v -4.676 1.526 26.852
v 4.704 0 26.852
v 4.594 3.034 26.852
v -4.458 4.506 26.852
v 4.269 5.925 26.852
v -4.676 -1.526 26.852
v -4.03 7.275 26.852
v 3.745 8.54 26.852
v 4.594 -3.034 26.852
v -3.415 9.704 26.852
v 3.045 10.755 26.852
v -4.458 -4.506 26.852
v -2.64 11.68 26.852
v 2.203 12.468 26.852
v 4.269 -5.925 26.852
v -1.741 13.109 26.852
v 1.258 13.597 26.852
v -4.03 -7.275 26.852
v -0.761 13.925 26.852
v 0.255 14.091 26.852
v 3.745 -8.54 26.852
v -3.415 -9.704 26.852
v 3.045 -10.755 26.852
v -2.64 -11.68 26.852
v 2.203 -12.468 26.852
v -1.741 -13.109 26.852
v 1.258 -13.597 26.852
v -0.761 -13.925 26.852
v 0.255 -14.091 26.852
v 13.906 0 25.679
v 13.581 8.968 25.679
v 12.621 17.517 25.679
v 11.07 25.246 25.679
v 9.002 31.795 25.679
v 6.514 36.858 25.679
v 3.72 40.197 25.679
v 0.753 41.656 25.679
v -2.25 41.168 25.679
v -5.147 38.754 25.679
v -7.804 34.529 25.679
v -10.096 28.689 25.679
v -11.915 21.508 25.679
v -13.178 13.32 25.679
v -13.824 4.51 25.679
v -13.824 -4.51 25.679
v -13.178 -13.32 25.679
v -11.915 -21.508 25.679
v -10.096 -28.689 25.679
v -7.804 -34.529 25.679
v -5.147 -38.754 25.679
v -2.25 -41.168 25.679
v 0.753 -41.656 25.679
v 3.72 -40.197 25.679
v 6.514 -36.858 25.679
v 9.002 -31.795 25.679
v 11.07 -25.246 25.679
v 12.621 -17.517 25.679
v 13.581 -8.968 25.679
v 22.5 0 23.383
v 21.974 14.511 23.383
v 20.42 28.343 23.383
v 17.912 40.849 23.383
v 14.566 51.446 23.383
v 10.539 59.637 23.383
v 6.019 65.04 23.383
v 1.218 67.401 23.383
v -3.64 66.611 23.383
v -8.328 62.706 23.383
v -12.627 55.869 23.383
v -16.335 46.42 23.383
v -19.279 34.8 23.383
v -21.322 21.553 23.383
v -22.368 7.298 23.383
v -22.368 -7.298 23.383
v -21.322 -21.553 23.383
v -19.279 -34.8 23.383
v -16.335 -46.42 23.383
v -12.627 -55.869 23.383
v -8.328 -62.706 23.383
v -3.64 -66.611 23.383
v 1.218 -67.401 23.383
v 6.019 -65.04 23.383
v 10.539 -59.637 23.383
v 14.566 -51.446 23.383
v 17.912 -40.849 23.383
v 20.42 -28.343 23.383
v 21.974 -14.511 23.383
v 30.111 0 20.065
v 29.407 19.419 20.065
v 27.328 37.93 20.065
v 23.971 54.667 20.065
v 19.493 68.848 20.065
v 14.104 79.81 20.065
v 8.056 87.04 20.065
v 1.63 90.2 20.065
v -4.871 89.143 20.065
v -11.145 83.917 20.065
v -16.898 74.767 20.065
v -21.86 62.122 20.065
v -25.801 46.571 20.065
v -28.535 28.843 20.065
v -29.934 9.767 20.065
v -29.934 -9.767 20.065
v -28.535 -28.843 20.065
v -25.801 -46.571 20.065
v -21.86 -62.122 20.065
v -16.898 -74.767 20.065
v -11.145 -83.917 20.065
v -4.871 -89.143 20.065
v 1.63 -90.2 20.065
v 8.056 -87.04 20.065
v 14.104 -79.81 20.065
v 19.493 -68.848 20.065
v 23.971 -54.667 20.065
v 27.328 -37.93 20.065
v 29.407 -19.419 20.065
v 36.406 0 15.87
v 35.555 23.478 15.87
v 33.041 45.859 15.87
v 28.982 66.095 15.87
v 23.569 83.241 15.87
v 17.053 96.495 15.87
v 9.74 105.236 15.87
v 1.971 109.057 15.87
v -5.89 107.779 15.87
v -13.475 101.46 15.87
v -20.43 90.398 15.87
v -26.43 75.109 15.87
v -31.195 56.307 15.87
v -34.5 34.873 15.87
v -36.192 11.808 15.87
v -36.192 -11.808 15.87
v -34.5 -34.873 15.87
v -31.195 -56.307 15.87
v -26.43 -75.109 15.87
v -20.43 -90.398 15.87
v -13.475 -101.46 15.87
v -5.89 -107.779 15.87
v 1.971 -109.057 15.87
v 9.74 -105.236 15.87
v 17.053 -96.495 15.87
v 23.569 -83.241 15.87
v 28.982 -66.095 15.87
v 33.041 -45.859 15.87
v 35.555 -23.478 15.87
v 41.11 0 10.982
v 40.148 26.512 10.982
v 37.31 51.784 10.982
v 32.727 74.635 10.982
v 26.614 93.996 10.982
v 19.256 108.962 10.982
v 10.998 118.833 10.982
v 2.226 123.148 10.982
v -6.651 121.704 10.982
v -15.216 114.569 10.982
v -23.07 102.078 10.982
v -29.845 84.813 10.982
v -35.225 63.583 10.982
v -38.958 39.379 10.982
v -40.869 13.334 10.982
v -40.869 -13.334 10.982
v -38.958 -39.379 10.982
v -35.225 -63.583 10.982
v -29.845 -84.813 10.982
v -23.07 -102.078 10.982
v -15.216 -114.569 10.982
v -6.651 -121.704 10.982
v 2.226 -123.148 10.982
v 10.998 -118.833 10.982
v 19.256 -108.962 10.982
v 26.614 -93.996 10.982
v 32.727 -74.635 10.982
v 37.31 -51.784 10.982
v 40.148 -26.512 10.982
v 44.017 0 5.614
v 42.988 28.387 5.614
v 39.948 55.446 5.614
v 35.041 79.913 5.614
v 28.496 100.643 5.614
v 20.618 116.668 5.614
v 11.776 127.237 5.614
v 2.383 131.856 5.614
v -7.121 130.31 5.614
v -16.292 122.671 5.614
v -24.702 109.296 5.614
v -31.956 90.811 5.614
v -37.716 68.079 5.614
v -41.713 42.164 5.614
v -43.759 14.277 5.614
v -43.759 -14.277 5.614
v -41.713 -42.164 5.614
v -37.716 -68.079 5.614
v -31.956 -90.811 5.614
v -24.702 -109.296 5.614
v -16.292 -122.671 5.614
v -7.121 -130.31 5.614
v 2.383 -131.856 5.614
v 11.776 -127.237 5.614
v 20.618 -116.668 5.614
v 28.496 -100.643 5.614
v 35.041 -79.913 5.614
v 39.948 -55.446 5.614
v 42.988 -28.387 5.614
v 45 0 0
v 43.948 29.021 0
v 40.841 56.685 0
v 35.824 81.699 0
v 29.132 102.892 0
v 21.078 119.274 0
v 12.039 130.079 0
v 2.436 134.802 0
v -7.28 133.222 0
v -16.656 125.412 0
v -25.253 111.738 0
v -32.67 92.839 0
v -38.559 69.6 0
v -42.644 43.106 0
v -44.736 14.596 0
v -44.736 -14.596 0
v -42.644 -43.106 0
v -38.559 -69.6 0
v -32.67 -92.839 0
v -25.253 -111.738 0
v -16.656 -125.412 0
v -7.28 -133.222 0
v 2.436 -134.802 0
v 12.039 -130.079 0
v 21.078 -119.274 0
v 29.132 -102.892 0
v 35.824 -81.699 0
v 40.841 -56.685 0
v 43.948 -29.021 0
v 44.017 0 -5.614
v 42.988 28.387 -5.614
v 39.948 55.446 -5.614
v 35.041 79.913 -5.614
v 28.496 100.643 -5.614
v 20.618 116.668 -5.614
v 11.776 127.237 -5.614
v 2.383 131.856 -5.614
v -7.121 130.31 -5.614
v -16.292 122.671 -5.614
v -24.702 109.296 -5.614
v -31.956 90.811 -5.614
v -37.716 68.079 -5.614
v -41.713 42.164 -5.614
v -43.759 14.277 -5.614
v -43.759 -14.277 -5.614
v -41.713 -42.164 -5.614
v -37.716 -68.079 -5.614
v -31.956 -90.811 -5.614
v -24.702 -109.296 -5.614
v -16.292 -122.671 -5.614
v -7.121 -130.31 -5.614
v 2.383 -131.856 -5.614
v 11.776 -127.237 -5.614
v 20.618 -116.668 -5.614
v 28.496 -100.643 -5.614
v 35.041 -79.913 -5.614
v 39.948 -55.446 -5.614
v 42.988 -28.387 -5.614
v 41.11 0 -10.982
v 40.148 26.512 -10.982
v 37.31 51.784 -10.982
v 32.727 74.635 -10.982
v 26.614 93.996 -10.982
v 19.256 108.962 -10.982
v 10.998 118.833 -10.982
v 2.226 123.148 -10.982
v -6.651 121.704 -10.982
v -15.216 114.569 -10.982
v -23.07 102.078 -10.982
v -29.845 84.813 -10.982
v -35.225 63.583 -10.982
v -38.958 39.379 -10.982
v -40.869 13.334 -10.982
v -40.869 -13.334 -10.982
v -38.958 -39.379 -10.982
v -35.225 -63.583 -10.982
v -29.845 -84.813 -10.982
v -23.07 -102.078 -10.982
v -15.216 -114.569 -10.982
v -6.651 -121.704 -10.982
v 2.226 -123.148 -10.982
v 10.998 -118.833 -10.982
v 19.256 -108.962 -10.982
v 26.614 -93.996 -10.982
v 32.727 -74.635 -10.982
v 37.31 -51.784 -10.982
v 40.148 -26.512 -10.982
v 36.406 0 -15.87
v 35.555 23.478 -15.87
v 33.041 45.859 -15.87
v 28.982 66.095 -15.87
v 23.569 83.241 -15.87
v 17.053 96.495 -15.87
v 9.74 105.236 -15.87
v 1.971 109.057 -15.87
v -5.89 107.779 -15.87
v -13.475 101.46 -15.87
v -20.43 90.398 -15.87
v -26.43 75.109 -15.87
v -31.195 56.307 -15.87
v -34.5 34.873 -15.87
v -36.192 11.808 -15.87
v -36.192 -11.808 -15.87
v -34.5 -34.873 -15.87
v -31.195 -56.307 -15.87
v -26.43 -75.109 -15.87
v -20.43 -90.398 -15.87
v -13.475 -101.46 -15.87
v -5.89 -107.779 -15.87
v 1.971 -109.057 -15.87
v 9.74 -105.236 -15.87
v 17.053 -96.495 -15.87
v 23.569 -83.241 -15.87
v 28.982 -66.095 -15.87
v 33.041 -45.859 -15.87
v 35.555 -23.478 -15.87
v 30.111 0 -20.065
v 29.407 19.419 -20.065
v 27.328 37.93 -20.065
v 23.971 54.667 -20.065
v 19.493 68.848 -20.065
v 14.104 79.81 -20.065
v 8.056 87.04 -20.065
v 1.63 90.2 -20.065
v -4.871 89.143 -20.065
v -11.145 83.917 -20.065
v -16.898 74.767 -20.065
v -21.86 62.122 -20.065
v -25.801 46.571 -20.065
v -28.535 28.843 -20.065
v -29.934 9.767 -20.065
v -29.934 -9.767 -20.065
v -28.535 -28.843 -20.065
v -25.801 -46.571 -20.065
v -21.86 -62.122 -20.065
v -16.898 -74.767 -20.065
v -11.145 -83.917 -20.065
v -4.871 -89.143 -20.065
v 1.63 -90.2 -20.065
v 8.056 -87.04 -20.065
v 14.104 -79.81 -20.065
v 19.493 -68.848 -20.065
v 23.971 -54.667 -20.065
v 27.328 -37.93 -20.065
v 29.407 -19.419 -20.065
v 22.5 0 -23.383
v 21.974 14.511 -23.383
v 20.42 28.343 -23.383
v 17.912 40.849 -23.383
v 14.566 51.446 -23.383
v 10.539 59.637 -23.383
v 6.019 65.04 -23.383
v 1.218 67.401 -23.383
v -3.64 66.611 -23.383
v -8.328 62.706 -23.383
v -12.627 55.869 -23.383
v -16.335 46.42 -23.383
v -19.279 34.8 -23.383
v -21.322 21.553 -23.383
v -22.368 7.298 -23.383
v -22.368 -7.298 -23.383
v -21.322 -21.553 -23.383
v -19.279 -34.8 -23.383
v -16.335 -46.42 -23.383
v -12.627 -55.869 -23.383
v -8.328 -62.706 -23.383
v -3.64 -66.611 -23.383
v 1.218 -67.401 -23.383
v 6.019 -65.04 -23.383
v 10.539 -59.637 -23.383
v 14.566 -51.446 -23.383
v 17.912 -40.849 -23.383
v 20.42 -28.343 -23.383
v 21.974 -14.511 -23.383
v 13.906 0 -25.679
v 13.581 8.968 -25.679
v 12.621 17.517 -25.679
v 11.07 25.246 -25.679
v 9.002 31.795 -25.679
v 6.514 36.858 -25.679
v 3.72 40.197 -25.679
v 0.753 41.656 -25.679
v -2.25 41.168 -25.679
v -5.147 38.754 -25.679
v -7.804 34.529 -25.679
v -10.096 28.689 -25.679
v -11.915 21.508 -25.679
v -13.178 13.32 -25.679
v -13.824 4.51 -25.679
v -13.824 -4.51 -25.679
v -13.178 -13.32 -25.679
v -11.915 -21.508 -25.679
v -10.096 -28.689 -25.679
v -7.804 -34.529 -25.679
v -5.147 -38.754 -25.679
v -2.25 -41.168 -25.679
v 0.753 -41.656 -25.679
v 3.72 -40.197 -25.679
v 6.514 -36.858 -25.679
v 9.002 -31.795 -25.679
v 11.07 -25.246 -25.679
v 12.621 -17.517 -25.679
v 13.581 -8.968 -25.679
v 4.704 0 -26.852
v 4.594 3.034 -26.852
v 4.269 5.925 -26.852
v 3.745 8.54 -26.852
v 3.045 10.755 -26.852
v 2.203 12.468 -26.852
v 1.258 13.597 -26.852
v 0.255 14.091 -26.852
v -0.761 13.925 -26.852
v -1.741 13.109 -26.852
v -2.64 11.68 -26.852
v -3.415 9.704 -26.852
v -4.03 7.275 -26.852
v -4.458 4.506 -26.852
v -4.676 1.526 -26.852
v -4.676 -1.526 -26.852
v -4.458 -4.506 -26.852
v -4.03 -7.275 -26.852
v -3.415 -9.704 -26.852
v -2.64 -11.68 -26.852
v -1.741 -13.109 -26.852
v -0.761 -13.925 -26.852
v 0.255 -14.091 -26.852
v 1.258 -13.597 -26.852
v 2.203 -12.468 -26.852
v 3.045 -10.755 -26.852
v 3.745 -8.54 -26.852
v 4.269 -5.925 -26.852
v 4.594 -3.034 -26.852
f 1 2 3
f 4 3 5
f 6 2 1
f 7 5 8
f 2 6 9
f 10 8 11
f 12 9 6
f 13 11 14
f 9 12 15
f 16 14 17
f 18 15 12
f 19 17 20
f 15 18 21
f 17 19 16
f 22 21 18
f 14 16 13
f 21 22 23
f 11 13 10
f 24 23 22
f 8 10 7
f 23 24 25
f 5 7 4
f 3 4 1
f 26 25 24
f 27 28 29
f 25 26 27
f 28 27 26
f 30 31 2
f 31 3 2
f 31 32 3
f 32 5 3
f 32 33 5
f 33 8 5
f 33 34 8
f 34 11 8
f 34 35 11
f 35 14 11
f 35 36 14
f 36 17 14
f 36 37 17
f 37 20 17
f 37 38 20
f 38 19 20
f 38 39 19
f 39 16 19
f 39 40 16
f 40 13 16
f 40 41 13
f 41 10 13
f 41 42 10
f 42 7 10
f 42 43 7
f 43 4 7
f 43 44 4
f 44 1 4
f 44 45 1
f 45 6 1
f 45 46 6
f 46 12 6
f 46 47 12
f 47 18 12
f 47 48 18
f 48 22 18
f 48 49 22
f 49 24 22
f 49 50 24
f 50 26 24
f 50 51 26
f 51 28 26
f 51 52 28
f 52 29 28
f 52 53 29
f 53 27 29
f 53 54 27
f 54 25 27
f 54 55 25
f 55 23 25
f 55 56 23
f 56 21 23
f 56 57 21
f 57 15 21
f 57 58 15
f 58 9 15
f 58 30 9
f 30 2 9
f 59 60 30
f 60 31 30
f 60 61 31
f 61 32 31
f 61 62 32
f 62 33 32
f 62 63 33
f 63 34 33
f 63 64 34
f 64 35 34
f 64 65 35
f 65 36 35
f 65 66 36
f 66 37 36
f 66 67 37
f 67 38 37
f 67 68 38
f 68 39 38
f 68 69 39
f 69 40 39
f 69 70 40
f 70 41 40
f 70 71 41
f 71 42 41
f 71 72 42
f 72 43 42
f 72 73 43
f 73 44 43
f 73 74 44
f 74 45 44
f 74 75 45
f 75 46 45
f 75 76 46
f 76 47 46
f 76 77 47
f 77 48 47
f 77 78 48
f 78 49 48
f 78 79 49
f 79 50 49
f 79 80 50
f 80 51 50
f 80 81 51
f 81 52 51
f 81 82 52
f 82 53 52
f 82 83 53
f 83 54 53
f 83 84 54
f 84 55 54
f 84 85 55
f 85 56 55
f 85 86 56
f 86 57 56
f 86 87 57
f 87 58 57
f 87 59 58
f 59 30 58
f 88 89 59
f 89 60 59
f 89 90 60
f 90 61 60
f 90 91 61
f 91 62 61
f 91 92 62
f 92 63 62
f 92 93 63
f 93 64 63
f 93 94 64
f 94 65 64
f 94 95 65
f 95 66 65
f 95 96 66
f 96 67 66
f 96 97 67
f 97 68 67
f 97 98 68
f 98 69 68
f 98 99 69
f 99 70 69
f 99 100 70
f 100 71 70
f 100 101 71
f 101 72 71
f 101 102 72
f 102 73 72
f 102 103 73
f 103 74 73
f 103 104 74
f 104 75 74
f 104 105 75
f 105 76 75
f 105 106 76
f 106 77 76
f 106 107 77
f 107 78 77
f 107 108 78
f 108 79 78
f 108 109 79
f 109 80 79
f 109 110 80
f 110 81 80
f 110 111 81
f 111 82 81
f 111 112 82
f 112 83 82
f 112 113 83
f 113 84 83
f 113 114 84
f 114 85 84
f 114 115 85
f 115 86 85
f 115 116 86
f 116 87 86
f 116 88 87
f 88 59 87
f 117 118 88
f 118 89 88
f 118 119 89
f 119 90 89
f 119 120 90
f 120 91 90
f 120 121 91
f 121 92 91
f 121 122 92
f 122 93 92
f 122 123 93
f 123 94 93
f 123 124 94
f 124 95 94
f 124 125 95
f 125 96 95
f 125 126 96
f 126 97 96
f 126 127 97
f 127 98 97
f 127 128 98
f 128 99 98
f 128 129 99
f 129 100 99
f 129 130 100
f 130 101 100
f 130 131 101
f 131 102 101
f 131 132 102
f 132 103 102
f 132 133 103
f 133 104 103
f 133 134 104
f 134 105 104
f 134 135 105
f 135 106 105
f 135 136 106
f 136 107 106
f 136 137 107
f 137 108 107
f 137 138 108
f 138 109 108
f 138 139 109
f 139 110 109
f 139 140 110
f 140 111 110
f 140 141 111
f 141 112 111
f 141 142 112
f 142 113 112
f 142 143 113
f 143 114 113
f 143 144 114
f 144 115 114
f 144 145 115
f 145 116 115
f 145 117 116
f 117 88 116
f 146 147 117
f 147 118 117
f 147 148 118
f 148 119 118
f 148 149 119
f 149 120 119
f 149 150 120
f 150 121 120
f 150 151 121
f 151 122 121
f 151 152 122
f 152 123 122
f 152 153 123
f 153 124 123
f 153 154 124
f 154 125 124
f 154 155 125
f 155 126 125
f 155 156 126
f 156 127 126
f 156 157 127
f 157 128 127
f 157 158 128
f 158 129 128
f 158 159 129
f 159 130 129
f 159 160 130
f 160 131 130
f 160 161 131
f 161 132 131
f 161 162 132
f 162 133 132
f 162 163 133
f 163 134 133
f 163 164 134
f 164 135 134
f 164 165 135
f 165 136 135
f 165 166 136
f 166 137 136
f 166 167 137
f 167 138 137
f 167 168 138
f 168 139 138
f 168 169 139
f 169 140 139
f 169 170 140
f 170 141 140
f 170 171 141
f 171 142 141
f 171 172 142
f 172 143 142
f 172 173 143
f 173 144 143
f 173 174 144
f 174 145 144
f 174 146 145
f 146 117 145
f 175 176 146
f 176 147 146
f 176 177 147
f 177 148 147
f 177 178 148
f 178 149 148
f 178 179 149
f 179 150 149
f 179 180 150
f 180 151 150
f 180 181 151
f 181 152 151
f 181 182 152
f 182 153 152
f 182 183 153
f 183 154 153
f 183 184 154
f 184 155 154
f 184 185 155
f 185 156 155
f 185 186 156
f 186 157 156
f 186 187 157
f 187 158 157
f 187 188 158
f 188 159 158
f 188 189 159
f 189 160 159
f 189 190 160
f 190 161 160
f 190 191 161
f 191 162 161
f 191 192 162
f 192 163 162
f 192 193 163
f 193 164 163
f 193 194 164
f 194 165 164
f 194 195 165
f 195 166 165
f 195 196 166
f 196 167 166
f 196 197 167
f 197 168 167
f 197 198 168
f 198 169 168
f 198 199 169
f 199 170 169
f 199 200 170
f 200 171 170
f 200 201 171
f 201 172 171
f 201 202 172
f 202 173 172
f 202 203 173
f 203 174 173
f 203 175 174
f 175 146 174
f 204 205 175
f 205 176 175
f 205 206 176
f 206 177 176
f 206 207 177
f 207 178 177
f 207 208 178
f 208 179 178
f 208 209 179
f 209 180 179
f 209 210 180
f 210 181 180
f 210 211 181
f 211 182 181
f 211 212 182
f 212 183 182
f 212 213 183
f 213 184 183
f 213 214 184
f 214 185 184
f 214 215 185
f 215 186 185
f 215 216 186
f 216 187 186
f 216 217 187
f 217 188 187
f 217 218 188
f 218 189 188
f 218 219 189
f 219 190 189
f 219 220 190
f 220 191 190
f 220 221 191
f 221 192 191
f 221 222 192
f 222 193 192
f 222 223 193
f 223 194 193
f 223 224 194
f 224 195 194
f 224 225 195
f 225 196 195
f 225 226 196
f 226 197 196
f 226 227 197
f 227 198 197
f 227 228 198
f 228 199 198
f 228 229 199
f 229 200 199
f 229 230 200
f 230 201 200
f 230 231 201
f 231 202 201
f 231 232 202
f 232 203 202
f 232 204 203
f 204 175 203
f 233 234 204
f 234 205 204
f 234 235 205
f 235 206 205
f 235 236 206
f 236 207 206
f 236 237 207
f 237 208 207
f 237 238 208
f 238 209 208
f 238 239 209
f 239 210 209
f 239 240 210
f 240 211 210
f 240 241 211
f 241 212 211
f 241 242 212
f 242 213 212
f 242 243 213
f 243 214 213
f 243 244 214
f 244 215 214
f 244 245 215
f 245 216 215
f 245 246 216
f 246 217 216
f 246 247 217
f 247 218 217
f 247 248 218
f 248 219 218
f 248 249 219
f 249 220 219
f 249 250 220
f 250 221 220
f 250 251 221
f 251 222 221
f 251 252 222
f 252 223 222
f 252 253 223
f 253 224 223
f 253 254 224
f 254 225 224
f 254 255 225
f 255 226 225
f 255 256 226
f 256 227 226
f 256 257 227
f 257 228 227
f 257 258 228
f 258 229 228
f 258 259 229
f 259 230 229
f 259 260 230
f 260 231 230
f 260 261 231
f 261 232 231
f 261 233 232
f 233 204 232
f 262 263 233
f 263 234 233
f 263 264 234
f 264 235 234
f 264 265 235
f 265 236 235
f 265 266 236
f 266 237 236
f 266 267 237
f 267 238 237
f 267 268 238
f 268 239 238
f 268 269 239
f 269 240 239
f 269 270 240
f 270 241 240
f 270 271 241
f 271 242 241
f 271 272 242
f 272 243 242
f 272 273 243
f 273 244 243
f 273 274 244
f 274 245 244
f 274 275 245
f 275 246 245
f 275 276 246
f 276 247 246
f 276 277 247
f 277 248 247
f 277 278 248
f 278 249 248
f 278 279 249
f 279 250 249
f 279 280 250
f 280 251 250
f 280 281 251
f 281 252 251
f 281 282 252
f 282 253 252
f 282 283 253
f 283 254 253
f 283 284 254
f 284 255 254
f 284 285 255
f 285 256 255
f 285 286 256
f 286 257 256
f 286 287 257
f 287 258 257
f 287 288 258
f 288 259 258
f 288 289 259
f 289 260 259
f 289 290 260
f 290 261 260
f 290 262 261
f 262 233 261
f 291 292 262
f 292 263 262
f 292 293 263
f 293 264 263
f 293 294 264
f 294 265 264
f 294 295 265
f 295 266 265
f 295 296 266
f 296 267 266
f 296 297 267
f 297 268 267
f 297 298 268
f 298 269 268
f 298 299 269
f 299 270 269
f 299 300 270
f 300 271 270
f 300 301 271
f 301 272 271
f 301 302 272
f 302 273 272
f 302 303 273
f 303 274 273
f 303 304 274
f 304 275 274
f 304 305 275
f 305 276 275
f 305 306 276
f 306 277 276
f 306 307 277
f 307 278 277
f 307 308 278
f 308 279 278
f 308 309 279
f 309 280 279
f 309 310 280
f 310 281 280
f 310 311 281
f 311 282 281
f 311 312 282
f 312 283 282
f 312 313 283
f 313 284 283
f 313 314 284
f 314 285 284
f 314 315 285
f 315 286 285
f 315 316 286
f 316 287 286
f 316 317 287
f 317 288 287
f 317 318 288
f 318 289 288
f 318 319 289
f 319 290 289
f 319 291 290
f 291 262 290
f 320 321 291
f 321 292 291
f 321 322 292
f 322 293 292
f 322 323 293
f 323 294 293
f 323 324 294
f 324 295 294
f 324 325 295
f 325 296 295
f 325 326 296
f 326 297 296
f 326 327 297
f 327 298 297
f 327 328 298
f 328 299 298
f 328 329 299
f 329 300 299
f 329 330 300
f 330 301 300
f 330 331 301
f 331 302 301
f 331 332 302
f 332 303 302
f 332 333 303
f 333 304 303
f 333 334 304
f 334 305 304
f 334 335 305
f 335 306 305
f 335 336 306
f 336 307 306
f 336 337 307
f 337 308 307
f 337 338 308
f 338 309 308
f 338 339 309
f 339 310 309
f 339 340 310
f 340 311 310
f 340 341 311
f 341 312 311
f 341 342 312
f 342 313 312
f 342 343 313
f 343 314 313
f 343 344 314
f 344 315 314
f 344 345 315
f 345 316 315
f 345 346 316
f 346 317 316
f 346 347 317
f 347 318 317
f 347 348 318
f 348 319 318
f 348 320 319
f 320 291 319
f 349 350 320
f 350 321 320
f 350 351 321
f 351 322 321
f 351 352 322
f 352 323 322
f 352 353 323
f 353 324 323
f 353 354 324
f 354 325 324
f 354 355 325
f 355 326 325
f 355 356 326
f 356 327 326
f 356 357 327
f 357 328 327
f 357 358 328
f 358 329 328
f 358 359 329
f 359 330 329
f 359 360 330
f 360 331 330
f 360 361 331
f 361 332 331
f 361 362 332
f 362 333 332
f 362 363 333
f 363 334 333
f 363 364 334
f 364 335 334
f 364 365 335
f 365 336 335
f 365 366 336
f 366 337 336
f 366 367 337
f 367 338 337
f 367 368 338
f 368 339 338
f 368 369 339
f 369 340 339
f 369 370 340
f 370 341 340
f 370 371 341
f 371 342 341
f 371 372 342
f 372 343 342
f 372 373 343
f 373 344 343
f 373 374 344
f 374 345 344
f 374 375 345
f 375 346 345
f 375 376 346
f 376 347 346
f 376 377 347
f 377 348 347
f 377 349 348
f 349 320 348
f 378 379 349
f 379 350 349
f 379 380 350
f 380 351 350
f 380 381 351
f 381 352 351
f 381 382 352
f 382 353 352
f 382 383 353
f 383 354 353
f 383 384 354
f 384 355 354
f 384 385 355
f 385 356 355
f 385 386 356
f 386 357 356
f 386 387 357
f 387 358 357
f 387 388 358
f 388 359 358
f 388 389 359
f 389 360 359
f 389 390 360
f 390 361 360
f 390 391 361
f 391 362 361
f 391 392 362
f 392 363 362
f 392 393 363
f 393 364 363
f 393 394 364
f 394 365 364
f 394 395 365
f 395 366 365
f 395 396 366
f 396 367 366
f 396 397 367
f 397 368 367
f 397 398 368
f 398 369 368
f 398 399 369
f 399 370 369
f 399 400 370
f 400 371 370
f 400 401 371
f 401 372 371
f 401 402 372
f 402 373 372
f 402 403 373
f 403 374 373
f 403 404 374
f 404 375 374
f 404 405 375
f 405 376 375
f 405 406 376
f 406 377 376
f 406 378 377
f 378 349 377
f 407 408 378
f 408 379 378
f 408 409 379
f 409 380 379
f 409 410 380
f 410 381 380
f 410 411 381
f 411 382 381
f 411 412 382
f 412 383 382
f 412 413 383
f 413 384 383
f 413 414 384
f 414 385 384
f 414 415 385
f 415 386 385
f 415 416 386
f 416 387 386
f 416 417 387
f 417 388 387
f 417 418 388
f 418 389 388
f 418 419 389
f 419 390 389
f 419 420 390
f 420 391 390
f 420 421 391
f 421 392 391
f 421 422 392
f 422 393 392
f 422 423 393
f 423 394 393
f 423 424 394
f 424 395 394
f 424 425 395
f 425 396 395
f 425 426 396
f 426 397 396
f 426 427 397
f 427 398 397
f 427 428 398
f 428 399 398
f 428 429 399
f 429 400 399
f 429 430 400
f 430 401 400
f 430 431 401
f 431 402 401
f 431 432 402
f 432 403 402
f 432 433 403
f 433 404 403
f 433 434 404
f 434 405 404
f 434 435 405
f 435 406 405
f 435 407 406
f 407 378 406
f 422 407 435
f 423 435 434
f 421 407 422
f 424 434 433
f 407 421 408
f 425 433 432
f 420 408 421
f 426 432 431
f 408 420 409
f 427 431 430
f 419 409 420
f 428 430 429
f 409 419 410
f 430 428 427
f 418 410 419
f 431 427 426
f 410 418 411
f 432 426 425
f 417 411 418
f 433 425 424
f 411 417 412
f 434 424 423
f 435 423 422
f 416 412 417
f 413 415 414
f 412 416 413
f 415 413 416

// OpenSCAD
// Generated by SolidPython 1.0.1 on 2020-07-29 00:46:46


scale(v = [5, 15, 3]) {
	sphere(r = 9);
}
/***********************************************
*********      SolidPython code:      **********
************************************************
 
# import packages: SolidPython
from solid import *
from solid.utils import *
from itertools import chain, combinations, permutations


class Resize:

    def __init__(self, scad_file):
        self.scad_file = scad_file
        #self.scad_file = import_scad(scad_file)
        # cone/cylinder param:
        self.r1 = 0
        self.r2 = 0
        self.h = 0
        # rectangular prism param:
        self.w = 0
        self.l = 0
        # ellipse param:
        self.r = 0

    # import OpenScad code (file name corresponds to shape)


    # classify shape + parameters
    def assign(self, param1, param2, param3):
        if self.scad_file == 'cone.scad':
            self.r1 = param1
            self.r2 = param2
            self.h = param3
        elif self.scad_file == 'cylinder.scad':
            self.r1 = param1
            self.r2 = param2
            self.h = param3
        elif self.scad_file == 'rectangularPrism.scad':
            self.h = param1
            self.l = param2
            self.w = param3
        else:
            self.r = param1
            self.h = param2

    # resize parameters
    def iterate(self):
        x = range(3, 20, 2)
        i = 1
        if self.scad_file == 'cone.scad':
            tempList = list(permutations(x, 2))
            for temp in tempList:
                param1 = temp[0]
                param2 = temp[1]
                filepath = 'produced_scad_files/' + 'cone' + str(param1) + '_' + str(param2) + '_' + '.scad'
                scad_render_to_file(cylinder(h=param1, r1=param2, r2=0), filepath)

        elif self.scad_file == 'cylinder.scad':
            tempList = list(permutations(x, 3))
            for temp in tempList:
                param1 = temp[0]
                param2 = temp[1]
                filepath = 'produced_scad_files/' + 'cylinder' + str(param1) + '_' + str(param2) + '_' + '.scad'
                scad_render_to_file(cylinder(h=param1, r1=param2, r2=param2), filepath)

        elif self.scad_file == 'rectangularPrism.scad':
            tempList = list(permutations(x, 3))
            for temp in tempList:
                param1 = temp[0]
                param2 = temp[1]
                param3 = temp[2]
                filepath = 'produced_scad_files/' + 'rectangularPrism' + str(param1) + '_' + str(param2) + '_' + str(
                    param3) + '.scad'
                scad_render_to_file(cube(size=(param1, param2, param3)), filepath)

        elif self.scad_file == 'ellipse.scad':
            tempList = list(permutations(x, 4))
            for temp in tempList:
                param1 = temp[0]
                param2 = temp[1]
                param3 = temp[2]
                param4 = temp[3]
                filepath = 'produced_scad_files/' + 'ellipse' + str(param1) + '_' + str(param2) + '_' + str(param3) + '_' + str(param4) + '.scad'
                scad_render_to_file(scale([param1, param2, param3])(sphere(r=param4)), filepath)

    def render_to_scadfile(self):
        scad_render_to_file(scad, 'example.scad') 
 
************************************************/
